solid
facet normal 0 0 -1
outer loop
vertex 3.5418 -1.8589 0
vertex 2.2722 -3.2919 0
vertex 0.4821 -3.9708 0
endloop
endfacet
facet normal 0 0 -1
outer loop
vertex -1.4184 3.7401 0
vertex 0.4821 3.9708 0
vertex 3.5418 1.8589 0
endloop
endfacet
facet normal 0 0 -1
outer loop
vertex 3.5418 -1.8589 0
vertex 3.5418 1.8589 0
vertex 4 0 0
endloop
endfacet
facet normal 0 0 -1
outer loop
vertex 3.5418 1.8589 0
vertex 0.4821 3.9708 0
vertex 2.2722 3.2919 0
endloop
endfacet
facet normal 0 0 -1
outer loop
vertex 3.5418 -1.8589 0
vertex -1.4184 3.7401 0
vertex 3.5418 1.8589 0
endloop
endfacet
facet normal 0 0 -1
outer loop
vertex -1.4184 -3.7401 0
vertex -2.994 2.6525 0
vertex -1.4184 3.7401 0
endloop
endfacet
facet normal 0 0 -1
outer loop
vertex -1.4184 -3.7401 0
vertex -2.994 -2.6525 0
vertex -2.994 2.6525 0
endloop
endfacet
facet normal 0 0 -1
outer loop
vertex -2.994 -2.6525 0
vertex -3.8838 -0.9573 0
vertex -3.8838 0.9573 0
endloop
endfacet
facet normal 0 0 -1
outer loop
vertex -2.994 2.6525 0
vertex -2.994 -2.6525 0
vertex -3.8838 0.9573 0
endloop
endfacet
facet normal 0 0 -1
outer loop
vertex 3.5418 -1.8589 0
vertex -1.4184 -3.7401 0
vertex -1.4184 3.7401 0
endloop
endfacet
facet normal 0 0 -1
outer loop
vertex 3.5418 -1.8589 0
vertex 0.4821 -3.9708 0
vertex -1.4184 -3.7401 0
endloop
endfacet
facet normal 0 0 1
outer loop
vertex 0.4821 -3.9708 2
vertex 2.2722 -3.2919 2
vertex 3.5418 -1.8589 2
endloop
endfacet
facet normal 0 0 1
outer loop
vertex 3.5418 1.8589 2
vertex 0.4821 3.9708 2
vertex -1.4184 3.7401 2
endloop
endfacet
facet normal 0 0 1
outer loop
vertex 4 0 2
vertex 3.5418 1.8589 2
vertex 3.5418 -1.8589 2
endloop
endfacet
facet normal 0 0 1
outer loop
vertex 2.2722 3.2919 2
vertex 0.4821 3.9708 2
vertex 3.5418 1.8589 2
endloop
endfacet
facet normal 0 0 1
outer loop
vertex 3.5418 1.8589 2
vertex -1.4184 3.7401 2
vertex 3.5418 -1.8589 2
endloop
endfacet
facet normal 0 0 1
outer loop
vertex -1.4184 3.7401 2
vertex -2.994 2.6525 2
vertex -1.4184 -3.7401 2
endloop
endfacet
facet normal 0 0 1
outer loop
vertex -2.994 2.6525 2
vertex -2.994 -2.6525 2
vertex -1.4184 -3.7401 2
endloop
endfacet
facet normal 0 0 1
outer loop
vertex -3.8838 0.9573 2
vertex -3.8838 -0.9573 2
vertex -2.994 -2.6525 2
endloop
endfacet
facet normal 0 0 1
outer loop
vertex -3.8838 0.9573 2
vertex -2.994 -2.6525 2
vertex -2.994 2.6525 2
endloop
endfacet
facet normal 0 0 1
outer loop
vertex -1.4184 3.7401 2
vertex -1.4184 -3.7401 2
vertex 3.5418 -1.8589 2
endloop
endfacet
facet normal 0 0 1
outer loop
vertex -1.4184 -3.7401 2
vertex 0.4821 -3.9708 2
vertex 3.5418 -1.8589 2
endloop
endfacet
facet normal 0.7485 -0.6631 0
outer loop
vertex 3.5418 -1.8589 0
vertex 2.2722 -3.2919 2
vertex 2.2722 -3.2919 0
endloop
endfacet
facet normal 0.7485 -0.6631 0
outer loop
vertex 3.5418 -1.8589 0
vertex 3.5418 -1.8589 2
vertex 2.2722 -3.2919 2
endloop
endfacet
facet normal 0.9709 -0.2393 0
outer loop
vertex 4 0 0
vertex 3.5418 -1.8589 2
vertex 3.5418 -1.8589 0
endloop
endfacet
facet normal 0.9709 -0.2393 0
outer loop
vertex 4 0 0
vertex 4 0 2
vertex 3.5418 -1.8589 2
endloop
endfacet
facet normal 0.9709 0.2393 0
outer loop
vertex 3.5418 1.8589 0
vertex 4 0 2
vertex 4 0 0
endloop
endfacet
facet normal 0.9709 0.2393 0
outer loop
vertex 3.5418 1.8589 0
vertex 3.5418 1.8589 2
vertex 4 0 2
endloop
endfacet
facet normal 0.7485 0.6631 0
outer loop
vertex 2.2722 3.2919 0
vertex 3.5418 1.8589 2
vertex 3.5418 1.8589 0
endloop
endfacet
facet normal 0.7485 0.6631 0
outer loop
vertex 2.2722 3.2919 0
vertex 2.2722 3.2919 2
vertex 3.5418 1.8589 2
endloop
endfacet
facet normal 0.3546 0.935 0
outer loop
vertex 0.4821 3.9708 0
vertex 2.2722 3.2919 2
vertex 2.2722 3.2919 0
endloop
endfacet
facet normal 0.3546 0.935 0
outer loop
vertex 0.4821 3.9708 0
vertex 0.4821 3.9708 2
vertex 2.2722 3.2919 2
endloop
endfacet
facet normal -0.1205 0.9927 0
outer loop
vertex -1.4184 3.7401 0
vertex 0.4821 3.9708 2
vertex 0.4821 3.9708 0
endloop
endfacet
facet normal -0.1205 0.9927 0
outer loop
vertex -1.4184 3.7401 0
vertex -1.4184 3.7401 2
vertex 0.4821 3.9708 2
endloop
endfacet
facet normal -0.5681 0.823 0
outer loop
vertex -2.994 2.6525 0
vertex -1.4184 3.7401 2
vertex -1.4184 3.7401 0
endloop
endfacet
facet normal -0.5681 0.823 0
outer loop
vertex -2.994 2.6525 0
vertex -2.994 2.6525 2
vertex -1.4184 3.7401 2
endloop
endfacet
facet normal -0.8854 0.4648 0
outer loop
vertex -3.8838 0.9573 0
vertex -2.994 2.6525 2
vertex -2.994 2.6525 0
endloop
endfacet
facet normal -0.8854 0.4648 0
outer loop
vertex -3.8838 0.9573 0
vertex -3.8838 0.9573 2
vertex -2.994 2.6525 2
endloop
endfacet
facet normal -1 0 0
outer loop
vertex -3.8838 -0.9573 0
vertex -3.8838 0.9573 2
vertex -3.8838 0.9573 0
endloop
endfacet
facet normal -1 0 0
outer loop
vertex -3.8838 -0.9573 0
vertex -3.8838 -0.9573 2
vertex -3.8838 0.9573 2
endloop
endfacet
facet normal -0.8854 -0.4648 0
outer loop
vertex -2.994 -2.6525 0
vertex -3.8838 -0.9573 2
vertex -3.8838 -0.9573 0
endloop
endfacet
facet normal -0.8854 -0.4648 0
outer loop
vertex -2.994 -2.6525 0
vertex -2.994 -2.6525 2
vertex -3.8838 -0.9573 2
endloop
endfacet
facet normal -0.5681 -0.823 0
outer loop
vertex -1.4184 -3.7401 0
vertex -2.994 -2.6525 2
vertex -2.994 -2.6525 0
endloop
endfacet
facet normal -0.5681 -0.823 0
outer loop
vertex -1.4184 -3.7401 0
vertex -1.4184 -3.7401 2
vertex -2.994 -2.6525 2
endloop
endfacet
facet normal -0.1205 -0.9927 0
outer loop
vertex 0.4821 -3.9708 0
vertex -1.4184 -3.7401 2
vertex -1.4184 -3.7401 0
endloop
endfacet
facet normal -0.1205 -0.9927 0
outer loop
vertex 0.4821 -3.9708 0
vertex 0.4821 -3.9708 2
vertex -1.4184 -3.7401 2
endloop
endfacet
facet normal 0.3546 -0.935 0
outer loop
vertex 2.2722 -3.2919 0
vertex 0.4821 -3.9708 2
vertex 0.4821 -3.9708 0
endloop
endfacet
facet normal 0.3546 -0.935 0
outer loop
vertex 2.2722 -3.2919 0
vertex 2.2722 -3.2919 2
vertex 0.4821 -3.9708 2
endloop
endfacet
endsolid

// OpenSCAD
// projection(cut=false) — the shadow: union of all cross-sections of a solid
// below origin, lifted back to a solid by linear_extrude so the corpus test
// classifies it Solid.
linear_extrude(height = 2) projection() translate([0, 0, -5]) cylinder(h = 10, r = 4);
